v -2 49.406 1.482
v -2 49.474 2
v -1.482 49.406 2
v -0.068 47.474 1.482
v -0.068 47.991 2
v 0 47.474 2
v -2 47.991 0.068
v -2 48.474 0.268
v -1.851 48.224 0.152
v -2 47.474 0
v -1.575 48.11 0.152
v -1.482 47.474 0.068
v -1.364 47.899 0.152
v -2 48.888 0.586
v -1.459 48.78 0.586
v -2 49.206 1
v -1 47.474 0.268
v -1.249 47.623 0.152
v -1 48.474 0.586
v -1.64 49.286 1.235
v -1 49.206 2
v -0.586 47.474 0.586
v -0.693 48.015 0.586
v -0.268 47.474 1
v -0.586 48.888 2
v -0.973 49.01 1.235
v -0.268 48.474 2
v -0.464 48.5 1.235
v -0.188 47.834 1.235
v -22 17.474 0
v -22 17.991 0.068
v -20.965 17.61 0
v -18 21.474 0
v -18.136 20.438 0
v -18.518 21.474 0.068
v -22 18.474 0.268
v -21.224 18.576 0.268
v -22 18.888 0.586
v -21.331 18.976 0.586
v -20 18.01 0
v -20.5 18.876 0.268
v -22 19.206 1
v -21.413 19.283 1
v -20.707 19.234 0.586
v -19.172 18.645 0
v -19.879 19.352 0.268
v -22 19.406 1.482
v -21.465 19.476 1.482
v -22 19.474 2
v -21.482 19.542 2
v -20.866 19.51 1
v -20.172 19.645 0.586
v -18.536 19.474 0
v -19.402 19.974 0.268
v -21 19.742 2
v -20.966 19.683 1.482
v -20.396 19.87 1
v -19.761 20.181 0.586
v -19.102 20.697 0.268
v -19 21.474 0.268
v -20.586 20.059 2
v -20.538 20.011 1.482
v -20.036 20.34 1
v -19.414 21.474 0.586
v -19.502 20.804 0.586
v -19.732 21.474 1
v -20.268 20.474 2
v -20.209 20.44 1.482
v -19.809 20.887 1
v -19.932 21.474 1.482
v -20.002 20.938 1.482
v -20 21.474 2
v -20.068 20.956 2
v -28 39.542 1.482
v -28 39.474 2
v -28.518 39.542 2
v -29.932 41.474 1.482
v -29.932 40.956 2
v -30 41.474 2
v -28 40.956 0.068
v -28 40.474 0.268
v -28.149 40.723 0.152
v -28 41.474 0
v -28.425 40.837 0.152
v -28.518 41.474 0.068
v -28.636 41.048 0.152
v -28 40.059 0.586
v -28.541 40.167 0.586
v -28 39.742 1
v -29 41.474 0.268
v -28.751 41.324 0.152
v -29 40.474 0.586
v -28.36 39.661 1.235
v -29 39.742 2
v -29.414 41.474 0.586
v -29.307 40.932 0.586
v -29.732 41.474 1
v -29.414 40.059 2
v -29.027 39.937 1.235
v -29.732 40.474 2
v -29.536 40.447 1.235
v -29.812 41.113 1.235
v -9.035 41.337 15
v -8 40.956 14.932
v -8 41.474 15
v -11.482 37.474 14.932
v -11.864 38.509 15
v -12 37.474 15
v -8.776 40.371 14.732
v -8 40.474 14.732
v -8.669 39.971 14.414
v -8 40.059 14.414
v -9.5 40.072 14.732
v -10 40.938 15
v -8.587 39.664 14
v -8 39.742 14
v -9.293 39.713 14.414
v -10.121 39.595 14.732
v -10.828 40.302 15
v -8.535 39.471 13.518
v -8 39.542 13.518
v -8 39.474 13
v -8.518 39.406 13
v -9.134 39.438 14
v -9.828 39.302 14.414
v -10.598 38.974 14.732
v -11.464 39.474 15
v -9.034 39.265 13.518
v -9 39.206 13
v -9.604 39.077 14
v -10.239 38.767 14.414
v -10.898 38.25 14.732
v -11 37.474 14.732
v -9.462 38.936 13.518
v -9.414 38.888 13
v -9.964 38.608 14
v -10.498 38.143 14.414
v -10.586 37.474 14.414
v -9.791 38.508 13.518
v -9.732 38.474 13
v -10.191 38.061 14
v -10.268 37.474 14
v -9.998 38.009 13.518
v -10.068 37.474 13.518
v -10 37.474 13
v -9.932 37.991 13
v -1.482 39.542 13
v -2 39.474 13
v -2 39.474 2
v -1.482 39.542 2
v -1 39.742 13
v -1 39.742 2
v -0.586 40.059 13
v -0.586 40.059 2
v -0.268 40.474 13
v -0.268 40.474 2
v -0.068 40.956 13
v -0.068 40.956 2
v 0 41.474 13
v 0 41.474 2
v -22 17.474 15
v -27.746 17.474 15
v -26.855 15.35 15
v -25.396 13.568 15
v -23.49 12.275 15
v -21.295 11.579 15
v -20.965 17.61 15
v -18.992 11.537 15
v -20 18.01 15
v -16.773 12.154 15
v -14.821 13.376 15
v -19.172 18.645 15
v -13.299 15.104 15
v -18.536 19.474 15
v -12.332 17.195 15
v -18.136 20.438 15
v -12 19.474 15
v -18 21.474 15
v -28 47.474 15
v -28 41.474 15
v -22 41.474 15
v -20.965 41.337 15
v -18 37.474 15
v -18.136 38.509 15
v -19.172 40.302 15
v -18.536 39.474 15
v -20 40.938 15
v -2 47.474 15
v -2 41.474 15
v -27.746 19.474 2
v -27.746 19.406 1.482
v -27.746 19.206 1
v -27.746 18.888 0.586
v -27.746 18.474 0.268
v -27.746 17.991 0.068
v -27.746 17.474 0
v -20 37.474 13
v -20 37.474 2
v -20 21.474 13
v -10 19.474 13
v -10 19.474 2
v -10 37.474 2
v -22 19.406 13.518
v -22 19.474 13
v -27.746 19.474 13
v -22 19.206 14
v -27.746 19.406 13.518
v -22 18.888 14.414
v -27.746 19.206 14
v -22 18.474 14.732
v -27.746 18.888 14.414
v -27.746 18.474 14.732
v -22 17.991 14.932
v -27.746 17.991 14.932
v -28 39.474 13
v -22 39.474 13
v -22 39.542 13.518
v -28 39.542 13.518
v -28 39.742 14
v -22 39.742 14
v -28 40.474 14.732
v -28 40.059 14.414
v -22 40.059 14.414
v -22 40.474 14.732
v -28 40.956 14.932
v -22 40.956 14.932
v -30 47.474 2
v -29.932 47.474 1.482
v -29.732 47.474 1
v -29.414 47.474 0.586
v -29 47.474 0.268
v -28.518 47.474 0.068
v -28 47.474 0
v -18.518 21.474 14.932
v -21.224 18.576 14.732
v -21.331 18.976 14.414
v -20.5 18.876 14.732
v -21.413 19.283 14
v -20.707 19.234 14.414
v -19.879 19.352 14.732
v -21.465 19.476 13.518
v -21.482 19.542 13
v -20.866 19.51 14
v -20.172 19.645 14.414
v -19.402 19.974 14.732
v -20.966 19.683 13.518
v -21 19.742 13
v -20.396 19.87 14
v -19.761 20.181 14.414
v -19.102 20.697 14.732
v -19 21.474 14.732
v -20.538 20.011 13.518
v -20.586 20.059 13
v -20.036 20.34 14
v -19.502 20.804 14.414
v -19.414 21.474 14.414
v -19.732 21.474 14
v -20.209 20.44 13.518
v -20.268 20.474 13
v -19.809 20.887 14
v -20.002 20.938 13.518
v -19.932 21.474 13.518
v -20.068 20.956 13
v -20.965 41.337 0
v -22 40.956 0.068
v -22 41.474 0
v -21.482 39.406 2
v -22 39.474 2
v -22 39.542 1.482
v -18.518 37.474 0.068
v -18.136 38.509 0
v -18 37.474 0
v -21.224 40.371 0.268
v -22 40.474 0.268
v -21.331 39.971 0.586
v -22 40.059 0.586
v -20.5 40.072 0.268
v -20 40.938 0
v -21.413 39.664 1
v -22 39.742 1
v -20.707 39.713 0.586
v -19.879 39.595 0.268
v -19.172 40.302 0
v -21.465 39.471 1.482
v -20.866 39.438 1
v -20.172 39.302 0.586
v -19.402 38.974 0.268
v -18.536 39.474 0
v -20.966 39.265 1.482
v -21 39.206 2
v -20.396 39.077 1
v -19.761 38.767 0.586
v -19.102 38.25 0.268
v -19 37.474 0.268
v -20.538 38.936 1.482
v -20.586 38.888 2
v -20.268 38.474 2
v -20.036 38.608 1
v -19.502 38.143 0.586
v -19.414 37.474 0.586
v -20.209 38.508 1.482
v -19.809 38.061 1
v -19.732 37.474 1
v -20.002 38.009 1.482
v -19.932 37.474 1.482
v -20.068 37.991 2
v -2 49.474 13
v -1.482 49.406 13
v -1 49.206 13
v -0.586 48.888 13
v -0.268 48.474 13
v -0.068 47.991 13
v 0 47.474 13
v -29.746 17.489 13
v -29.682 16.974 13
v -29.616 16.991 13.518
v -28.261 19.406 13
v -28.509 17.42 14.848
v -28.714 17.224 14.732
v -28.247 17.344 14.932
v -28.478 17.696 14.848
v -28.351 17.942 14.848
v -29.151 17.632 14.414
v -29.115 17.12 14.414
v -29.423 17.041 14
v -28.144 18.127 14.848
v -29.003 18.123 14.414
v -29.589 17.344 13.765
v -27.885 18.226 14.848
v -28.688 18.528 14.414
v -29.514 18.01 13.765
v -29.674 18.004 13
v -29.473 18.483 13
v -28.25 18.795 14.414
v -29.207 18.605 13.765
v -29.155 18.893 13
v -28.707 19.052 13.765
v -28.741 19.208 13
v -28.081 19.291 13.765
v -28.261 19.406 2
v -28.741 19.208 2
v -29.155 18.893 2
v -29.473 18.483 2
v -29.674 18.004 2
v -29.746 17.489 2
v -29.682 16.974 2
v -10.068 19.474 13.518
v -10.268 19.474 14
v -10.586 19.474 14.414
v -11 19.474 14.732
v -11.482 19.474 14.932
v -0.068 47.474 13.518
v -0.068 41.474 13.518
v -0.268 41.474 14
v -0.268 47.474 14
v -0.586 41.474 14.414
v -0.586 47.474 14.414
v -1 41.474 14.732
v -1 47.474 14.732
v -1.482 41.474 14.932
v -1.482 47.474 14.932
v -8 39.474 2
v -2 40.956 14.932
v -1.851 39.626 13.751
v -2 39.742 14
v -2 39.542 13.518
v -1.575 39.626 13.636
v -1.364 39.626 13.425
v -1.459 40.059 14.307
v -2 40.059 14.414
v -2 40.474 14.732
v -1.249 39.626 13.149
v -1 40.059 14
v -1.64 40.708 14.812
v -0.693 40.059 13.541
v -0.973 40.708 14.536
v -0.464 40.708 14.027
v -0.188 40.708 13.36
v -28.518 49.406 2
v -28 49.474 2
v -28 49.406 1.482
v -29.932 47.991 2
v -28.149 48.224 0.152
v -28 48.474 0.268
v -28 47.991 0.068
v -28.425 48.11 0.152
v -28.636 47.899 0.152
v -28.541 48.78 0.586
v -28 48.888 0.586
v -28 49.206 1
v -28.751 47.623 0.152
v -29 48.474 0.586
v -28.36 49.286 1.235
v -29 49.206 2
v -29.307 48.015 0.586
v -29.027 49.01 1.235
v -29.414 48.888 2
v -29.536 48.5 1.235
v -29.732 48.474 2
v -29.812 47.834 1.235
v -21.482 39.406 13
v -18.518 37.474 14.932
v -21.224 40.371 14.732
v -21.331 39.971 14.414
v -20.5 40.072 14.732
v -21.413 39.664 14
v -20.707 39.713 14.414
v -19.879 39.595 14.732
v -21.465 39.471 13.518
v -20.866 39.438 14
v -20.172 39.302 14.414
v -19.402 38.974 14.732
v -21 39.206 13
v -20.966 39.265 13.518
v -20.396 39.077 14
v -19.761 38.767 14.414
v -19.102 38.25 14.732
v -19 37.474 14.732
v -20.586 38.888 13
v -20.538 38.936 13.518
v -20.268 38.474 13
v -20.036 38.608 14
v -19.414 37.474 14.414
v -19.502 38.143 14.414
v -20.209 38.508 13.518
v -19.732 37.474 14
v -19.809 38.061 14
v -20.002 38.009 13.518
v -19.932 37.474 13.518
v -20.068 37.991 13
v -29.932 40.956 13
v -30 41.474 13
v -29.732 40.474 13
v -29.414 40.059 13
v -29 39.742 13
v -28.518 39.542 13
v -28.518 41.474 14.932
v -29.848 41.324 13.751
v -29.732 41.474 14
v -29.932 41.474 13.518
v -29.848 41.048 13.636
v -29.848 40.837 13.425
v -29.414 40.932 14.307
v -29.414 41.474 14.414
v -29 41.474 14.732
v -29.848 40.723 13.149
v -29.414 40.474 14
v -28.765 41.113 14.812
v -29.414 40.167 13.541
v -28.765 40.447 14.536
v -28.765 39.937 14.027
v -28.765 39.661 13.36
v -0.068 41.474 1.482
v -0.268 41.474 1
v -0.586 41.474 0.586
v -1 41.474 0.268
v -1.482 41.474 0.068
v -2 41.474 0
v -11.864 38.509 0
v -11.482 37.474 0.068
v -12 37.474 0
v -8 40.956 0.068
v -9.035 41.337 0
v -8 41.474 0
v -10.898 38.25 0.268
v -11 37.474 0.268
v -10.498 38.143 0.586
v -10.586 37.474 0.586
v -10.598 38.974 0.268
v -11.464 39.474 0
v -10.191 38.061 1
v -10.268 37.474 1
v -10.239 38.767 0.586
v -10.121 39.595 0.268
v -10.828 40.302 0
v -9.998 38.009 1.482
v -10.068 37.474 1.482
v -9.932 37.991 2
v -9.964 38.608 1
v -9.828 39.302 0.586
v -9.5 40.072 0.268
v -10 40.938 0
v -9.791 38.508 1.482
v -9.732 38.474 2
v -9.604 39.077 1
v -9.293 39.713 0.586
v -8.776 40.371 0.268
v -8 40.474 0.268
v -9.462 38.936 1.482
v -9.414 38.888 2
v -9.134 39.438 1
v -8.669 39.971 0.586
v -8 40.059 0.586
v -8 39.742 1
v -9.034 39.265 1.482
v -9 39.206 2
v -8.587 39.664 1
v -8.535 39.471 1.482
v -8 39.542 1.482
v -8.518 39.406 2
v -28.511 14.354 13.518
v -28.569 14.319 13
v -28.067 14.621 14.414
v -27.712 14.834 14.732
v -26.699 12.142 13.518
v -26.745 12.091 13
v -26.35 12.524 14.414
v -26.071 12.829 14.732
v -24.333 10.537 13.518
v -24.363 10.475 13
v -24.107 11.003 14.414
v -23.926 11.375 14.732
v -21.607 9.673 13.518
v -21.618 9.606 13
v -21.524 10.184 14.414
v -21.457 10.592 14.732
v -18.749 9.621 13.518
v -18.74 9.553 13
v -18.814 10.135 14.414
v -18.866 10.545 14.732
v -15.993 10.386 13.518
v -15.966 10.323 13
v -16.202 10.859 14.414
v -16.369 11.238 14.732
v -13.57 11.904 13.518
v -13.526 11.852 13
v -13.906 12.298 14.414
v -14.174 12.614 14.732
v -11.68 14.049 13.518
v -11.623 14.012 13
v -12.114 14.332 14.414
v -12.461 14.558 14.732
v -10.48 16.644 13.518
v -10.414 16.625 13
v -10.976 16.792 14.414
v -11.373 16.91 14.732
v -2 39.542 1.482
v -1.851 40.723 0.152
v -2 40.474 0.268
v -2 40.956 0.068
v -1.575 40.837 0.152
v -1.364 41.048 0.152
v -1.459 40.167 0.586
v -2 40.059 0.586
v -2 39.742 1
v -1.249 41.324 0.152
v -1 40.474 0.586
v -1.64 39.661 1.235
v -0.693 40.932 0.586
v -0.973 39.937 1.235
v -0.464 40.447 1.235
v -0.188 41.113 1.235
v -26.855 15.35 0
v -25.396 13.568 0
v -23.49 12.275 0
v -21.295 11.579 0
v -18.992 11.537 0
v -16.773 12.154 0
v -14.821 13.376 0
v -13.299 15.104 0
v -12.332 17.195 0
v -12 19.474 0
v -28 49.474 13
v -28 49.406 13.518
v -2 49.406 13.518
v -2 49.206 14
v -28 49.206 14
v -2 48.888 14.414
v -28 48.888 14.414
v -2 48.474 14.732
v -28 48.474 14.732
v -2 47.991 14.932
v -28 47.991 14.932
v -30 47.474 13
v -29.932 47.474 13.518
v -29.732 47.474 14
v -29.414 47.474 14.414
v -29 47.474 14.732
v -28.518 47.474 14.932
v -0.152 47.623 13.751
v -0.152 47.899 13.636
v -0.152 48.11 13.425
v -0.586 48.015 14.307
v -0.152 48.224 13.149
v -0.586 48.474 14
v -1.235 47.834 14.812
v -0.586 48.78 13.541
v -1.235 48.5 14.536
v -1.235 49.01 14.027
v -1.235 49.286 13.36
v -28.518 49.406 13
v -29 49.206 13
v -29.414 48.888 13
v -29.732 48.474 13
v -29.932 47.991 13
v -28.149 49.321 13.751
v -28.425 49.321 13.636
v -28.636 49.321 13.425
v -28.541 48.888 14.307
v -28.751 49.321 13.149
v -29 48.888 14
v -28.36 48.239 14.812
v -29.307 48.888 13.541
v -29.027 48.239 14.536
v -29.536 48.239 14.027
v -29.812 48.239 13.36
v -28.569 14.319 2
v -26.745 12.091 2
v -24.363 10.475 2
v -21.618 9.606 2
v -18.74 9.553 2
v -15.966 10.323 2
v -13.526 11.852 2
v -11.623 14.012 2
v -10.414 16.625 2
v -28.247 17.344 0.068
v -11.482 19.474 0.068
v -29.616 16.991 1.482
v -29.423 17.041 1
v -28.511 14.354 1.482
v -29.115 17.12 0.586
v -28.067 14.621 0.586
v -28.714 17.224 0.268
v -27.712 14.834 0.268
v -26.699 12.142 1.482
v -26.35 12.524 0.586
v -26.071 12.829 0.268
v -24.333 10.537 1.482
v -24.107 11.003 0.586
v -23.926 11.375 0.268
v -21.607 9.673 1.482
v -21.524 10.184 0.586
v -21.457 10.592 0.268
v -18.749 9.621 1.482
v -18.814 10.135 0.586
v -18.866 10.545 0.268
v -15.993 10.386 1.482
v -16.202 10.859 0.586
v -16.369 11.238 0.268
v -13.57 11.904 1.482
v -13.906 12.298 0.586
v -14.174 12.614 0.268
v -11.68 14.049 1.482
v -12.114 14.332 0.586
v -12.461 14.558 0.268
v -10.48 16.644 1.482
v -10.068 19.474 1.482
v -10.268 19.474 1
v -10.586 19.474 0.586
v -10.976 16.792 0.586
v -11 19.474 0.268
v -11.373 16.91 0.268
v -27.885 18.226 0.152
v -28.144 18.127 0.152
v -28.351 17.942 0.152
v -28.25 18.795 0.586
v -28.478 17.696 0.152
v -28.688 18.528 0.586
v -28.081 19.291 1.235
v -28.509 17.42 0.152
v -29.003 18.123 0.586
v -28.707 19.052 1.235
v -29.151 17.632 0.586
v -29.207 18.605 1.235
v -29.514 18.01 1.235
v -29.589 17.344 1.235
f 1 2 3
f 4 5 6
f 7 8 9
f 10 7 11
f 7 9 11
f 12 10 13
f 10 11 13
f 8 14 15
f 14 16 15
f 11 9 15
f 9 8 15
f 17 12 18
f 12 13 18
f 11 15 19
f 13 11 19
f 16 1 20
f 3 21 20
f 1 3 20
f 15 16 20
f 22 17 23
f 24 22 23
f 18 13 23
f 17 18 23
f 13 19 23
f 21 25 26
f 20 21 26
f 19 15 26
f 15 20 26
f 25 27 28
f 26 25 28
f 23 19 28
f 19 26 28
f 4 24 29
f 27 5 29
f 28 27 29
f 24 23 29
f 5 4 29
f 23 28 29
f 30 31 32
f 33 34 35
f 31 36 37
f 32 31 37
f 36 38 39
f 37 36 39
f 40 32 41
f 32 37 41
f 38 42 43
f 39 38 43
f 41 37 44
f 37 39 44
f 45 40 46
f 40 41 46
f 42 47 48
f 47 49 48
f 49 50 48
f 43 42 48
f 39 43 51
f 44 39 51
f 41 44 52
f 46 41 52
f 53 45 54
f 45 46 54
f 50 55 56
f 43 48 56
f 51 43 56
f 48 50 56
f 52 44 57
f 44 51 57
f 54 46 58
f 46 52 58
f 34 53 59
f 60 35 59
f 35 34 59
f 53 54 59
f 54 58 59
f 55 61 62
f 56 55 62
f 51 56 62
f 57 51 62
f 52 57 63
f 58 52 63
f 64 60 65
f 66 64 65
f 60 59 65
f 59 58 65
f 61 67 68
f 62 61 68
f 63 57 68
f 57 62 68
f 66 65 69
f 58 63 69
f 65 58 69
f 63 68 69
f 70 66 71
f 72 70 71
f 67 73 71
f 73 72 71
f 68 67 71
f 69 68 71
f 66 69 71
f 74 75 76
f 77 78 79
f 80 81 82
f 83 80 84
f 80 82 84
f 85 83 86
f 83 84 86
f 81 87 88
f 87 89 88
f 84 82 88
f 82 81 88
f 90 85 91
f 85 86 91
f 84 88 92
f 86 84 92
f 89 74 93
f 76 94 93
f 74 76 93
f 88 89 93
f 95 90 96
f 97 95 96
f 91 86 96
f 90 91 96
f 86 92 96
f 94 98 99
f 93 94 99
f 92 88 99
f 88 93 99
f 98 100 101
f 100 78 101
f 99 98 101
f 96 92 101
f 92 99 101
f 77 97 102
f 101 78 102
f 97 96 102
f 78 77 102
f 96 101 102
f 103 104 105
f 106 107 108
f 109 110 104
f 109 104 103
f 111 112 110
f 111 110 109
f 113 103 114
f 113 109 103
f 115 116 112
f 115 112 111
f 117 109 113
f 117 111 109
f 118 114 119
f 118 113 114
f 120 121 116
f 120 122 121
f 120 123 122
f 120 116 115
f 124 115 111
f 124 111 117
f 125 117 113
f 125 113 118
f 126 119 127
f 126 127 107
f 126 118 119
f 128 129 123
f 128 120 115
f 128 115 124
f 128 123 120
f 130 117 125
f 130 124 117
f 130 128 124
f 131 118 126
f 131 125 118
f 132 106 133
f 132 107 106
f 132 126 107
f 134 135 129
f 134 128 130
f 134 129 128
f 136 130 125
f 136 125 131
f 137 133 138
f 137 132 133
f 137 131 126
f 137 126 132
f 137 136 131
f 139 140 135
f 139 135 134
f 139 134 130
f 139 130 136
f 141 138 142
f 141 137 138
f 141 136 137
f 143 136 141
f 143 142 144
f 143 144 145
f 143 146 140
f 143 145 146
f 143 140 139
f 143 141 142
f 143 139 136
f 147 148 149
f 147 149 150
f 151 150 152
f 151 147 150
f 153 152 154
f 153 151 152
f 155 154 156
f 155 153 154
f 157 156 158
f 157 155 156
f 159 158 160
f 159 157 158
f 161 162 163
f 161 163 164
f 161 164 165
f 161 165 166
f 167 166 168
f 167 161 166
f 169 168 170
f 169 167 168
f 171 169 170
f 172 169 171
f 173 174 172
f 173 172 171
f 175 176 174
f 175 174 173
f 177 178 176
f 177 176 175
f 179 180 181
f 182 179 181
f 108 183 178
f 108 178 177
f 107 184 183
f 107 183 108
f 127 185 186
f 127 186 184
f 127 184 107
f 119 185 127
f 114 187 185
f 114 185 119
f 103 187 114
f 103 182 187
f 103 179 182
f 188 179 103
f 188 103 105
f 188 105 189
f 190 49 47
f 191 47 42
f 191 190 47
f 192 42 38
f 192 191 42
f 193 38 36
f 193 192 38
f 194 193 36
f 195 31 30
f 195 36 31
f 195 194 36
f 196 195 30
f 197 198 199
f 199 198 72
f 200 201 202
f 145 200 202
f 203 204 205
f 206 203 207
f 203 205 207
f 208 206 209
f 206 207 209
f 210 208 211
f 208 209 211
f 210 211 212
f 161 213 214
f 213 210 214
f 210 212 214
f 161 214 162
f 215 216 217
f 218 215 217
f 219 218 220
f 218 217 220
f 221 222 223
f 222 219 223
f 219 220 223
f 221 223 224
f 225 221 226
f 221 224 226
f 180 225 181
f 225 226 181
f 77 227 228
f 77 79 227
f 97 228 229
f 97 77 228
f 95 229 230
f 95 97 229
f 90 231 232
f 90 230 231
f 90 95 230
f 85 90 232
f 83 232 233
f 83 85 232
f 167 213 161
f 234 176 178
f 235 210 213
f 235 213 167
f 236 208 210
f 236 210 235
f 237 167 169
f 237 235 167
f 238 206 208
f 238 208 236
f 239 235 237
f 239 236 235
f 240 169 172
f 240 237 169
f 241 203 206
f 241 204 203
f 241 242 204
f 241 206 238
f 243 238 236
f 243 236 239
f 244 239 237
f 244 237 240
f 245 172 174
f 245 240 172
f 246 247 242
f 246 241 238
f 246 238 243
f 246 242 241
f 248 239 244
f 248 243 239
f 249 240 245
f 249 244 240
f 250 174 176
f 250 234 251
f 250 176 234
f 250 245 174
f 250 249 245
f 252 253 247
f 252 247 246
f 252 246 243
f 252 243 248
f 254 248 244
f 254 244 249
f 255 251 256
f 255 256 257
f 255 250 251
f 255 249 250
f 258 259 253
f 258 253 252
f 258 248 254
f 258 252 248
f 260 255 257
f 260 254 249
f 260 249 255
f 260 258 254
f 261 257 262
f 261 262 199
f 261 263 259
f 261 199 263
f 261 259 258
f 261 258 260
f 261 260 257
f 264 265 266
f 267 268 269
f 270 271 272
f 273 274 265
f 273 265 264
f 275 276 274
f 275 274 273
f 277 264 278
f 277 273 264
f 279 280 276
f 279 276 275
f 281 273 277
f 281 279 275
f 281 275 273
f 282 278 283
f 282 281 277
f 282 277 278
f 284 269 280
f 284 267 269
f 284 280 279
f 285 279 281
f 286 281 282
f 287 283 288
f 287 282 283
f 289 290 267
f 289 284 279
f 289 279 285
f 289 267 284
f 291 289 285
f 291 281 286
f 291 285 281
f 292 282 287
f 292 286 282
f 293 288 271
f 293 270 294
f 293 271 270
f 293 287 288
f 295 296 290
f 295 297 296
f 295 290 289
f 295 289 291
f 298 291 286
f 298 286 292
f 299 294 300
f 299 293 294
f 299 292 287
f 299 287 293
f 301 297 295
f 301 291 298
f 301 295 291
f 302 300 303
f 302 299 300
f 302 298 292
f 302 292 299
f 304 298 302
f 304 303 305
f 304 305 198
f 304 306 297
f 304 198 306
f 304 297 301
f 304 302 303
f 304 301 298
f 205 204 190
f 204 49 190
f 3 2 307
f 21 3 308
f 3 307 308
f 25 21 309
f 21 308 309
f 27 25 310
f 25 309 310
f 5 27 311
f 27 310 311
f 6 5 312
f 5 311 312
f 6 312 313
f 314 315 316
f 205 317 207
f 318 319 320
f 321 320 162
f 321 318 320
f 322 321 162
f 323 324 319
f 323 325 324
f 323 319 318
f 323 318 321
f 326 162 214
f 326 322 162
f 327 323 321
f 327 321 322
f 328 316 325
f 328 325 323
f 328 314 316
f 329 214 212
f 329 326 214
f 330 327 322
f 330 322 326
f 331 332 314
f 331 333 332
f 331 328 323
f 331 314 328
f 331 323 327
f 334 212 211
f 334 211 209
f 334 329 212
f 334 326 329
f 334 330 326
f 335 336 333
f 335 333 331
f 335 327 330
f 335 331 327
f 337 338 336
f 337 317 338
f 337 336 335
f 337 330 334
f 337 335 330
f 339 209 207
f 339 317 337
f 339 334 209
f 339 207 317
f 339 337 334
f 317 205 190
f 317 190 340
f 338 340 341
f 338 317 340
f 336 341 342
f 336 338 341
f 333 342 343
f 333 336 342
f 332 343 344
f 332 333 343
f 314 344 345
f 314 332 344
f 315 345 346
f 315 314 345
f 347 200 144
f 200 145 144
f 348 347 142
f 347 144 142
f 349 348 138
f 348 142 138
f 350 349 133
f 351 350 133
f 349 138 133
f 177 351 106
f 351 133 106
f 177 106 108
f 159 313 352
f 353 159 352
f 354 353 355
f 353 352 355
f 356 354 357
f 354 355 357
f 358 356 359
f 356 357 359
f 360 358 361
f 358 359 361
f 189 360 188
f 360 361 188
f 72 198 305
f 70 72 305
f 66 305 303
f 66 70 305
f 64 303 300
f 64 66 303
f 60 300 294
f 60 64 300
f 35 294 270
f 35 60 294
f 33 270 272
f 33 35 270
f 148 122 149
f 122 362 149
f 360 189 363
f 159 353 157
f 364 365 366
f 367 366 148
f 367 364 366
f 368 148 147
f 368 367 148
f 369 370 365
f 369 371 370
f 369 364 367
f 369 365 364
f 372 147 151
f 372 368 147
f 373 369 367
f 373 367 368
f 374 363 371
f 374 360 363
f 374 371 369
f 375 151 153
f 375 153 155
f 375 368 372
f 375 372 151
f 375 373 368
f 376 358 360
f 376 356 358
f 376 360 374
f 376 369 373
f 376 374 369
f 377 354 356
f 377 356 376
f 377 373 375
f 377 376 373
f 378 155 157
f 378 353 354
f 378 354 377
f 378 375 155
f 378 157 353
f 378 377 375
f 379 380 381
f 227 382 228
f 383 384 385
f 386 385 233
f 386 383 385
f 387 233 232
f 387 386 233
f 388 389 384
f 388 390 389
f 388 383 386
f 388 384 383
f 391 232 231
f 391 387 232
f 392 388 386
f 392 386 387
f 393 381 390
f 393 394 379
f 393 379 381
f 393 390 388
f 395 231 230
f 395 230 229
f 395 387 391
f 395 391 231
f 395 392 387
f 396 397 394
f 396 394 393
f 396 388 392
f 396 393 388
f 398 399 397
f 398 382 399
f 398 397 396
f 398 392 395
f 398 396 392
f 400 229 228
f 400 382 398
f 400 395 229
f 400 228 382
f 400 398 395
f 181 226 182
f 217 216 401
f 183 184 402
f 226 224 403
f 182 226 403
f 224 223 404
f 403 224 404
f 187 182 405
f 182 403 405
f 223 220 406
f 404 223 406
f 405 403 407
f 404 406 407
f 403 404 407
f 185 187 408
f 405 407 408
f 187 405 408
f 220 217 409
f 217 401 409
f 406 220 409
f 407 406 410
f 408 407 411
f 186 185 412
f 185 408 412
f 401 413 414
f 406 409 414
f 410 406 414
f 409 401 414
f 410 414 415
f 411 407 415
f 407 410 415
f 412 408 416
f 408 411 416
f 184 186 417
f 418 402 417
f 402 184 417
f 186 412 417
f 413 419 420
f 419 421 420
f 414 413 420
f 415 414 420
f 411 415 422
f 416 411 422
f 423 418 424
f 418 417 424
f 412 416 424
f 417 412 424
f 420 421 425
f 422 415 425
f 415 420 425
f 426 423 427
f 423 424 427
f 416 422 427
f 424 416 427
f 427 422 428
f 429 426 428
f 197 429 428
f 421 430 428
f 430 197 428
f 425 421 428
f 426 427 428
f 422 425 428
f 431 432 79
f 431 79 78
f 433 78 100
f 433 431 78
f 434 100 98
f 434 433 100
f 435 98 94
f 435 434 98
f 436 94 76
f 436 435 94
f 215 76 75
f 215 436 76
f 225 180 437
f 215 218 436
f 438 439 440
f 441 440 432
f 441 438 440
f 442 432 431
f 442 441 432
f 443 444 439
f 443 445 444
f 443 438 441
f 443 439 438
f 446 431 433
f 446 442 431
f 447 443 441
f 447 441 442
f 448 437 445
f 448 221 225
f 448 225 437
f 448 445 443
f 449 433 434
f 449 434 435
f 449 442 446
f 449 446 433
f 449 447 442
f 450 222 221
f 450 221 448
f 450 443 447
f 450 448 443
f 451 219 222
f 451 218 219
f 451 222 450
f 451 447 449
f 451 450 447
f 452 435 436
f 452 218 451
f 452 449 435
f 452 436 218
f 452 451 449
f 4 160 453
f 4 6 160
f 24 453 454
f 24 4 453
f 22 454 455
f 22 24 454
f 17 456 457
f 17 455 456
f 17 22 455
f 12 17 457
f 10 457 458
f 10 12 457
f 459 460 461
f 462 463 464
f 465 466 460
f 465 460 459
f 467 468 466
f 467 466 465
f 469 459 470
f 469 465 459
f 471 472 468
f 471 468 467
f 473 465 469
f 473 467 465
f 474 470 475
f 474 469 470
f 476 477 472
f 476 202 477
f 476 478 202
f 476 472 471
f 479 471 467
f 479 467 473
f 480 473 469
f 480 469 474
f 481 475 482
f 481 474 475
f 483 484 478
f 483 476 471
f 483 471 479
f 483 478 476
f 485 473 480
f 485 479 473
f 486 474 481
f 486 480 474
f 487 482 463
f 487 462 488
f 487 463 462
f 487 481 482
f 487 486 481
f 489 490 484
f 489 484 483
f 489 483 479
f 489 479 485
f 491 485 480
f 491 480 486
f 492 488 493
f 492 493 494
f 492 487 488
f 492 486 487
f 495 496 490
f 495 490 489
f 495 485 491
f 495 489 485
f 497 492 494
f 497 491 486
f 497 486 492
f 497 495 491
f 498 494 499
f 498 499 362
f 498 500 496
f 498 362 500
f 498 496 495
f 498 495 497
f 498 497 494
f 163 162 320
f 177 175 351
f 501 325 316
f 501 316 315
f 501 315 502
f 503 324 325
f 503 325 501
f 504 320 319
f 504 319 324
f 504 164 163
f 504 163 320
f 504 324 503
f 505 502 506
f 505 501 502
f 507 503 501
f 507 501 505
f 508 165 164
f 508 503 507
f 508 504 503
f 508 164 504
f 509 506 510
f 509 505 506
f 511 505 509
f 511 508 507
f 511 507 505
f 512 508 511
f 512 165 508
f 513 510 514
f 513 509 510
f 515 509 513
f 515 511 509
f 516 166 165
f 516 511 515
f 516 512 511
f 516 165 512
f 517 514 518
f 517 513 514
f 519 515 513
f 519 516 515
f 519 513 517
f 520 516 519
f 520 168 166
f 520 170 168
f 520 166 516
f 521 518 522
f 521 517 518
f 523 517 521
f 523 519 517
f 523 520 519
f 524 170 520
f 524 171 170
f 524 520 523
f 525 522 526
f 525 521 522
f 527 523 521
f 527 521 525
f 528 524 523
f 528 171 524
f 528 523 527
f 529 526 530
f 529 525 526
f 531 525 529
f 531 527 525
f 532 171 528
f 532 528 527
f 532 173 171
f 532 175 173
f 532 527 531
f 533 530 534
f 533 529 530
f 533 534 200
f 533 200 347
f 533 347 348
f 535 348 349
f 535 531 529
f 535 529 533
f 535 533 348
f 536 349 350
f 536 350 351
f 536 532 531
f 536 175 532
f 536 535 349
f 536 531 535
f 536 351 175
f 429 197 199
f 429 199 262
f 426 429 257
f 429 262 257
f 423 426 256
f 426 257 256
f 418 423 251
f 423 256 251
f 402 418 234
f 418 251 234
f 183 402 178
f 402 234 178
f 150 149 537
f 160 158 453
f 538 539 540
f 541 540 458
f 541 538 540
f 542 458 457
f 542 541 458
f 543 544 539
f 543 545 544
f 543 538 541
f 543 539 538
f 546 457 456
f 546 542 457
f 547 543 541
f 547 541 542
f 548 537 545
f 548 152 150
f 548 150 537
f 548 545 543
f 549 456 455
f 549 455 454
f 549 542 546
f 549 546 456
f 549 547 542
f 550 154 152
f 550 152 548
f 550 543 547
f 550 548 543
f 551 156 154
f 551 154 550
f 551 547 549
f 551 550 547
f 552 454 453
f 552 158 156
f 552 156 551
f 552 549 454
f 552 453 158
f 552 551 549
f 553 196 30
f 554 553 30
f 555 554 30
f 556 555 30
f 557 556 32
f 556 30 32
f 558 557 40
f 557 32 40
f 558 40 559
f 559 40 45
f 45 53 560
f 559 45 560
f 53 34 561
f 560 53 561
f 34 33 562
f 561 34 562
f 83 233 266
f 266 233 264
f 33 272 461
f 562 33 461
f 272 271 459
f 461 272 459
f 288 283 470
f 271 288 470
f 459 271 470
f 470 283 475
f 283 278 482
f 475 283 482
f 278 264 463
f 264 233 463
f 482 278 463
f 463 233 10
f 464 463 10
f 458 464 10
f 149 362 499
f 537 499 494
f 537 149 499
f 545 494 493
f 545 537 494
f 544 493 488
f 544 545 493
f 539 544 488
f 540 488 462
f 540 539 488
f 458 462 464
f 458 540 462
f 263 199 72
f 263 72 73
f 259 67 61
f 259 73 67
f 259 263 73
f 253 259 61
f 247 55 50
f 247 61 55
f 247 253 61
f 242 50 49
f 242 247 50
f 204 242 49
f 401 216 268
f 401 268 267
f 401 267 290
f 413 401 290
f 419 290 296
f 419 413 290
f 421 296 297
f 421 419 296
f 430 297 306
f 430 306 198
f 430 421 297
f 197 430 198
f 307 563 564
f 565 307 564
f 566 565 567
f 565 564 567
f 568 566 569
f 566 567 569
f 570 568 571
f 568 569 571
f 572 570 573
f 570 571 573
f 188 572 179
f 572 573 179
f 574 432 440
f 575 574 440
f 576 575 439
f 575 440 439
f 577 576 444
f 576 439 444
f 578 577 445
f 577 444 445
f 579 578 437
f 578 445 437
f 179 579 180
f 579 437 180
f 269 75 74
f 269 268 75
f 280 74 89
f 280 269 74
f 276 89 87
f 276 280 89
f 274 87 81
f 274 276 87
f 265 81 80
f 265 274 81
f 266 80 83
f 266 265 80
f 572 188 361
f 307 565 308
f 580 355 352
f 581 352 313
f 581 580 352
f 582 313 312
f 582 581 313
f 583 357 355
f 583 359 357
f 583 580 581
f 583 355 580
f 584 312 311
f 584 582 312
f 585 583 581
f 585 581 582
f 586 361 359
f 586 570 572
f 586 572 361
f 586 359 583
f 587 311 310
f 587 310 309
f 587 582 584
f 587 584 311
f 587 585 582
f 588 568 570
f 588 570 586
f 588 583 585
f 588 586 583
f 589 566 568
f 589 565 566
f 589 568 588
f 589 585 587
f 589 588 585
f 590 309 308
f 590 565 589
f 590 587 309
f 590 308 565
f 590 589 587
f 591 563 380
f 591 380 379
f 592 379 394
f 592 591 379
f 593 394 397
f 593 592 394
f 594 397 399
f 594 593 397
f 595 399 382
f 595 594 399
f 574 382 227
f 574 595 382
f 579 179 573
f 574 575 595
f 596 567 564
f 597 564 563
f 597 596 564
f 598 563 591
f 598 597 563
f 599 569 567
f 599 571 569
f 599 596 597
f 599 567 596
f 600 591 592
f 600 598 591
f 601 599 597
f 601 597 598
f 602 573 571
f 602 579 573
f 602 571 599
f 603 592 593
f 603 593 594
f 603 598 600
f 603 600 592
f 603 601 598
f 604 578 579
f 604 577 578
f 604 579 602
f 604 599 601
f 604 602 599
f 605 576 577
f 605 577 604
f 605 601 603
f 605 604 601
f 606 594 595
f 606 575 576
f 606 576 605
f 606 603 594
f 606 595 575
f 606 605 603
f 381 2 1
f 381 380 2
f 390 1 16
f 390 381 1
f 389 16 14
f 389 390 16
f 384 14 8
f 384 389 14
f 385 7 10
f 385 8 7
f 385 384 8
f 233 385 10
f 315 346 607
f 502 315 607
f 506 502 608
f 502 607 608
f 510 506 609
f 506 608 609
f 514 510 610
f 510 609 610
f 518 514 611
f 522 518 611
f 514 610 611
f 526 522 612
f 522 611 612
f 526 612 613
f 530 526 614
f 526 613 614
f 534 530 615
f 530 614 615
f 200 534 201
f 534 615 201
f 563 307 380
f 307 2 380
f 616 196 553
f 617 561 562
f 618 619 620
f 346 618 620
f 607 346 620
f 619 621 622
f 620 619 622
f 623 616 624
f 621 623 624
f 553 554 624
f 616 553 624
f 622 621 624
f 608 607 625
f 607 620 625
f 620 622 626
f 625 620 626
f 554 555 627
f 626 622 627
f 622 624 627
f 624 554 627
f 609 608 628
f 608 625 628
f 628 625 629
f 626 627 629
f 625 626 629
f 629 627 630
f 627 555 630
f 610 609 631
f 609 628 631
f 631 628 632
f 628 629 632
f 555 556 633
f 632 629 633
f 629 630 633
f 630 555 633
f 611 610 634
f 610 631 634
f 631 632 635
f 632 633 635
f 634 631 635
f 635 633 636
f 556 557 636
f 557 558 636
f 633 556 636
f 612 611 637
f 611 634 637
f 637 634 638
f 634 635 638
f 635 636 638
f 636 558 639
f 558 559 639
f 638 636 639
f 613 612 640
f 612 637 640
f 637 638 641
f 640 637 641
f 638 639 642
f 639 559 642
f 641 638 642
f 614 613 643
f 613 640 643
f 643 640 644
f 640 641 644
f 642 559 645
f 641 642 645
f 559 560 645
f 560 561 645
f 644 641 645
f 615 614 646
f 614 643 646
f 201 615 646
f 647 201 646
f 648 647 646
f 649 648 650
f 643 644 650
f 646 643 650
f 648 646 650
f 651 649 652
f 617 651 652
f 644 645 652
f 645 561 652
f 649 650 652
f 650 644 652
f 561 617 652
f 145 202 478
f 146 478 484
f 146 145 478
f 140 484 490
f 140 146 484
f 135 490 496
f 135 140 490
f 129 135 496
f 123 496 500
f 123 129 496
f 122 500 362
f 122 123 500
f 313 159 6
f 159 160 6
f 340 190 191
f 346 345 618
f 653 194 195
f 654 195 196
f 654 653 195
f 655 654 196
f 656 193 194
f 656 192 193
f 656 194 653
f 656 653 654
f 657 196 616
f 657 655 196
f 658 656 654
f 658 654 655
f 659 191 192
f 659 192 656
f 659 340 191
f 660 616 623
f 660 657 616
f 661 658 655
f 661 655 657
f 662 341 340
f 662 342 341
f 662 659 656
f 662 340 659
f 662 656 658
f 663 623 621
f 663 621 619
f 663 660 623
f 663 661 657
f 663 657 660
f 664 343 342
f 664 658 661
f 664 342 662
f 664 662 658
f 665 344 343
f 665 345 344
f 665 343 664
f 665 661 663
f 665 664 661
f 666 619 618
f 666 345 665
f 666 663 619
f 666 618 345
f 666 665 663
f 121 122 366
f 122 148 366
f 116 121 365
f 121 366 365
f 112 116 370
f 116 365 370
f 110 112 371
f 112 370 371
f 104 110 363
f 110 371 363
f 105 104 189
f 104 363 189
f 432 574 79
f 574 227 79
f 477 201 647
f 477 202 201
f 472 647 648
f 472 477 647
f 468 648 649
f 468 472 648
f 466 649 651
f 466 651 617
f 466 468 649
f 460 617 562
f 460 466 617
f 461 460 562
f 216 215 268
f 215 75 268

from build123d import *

# Parameters (mm, degrees)
F1_DEPTH = 15
F2_R     = 2


with BuildPart() as f1:
    # F0 (on Top) → F1 (new body)
    with BuildSketch(Plane.XY):
        with BuildLine():
            Line((0, 49.473686), (-30, 49.473686))
            Line((-30, 49.473686), (-30, 39.473686))
            Line((-30, 39.473686), (-20, 39.473686))
            Line((-20, 39.473686), (-20, 19.473686))
            Line((-20, 19.473686), (-30, 19.473686))
            ThreePointArc((-30, 19.473686), (-20, 9.473686), (-10, 19.473686))
            Line((-10, 19.473686), (-10, 39.473686))
            Line((-10, 39.473686), (0, 39.473686))
            Line((0, 39.473686), (0, 49.473686))
        make_face()
    extrude(amount=F1_DEPTH)

    # F2
    f2_edges = [f1.edges().sort_by_distance(p)[0] for p in [
        (-25, 39.473686, 15),
        (-30, 44.473686, 15),
        (-15, 49.473686, 15),
        (0, 44.473686, 15),
        (-5, 39.473686, 15),
        (-10, 29.473686, 15),
        (-20, 9.473686, 15),
        (-25, 19.473686, 15),
        (-20, 29.473686, 15),
        (-10, 39.473686, 7.5),
        (0, 39.473686, 7.5),
        (0, 49.473686, 7.5),
        (-30, 39.473686, 7.5),
        (-30, 49.473686, 7.5),
        (-30, 19.473686, 7.5),
        (-20, 19.473686, 7.5),
        (-25, 19.473686, 0),
        (-25, 39.473686, 0),
        (-15, 49.473686, 0),
        (-30, 44.473686, 0),
        (-20, 9.473686, 0),
        (-20, 29.473686, 0),
        (-10, 29.473686, 0),
        (-5, 39.473686, 0),
        (0, 44.473686, 0),
        (-20, 39.473686, 7.5),
    ]]
    fillet(f2_edges, radius=F2_R)


solid = f1.part
